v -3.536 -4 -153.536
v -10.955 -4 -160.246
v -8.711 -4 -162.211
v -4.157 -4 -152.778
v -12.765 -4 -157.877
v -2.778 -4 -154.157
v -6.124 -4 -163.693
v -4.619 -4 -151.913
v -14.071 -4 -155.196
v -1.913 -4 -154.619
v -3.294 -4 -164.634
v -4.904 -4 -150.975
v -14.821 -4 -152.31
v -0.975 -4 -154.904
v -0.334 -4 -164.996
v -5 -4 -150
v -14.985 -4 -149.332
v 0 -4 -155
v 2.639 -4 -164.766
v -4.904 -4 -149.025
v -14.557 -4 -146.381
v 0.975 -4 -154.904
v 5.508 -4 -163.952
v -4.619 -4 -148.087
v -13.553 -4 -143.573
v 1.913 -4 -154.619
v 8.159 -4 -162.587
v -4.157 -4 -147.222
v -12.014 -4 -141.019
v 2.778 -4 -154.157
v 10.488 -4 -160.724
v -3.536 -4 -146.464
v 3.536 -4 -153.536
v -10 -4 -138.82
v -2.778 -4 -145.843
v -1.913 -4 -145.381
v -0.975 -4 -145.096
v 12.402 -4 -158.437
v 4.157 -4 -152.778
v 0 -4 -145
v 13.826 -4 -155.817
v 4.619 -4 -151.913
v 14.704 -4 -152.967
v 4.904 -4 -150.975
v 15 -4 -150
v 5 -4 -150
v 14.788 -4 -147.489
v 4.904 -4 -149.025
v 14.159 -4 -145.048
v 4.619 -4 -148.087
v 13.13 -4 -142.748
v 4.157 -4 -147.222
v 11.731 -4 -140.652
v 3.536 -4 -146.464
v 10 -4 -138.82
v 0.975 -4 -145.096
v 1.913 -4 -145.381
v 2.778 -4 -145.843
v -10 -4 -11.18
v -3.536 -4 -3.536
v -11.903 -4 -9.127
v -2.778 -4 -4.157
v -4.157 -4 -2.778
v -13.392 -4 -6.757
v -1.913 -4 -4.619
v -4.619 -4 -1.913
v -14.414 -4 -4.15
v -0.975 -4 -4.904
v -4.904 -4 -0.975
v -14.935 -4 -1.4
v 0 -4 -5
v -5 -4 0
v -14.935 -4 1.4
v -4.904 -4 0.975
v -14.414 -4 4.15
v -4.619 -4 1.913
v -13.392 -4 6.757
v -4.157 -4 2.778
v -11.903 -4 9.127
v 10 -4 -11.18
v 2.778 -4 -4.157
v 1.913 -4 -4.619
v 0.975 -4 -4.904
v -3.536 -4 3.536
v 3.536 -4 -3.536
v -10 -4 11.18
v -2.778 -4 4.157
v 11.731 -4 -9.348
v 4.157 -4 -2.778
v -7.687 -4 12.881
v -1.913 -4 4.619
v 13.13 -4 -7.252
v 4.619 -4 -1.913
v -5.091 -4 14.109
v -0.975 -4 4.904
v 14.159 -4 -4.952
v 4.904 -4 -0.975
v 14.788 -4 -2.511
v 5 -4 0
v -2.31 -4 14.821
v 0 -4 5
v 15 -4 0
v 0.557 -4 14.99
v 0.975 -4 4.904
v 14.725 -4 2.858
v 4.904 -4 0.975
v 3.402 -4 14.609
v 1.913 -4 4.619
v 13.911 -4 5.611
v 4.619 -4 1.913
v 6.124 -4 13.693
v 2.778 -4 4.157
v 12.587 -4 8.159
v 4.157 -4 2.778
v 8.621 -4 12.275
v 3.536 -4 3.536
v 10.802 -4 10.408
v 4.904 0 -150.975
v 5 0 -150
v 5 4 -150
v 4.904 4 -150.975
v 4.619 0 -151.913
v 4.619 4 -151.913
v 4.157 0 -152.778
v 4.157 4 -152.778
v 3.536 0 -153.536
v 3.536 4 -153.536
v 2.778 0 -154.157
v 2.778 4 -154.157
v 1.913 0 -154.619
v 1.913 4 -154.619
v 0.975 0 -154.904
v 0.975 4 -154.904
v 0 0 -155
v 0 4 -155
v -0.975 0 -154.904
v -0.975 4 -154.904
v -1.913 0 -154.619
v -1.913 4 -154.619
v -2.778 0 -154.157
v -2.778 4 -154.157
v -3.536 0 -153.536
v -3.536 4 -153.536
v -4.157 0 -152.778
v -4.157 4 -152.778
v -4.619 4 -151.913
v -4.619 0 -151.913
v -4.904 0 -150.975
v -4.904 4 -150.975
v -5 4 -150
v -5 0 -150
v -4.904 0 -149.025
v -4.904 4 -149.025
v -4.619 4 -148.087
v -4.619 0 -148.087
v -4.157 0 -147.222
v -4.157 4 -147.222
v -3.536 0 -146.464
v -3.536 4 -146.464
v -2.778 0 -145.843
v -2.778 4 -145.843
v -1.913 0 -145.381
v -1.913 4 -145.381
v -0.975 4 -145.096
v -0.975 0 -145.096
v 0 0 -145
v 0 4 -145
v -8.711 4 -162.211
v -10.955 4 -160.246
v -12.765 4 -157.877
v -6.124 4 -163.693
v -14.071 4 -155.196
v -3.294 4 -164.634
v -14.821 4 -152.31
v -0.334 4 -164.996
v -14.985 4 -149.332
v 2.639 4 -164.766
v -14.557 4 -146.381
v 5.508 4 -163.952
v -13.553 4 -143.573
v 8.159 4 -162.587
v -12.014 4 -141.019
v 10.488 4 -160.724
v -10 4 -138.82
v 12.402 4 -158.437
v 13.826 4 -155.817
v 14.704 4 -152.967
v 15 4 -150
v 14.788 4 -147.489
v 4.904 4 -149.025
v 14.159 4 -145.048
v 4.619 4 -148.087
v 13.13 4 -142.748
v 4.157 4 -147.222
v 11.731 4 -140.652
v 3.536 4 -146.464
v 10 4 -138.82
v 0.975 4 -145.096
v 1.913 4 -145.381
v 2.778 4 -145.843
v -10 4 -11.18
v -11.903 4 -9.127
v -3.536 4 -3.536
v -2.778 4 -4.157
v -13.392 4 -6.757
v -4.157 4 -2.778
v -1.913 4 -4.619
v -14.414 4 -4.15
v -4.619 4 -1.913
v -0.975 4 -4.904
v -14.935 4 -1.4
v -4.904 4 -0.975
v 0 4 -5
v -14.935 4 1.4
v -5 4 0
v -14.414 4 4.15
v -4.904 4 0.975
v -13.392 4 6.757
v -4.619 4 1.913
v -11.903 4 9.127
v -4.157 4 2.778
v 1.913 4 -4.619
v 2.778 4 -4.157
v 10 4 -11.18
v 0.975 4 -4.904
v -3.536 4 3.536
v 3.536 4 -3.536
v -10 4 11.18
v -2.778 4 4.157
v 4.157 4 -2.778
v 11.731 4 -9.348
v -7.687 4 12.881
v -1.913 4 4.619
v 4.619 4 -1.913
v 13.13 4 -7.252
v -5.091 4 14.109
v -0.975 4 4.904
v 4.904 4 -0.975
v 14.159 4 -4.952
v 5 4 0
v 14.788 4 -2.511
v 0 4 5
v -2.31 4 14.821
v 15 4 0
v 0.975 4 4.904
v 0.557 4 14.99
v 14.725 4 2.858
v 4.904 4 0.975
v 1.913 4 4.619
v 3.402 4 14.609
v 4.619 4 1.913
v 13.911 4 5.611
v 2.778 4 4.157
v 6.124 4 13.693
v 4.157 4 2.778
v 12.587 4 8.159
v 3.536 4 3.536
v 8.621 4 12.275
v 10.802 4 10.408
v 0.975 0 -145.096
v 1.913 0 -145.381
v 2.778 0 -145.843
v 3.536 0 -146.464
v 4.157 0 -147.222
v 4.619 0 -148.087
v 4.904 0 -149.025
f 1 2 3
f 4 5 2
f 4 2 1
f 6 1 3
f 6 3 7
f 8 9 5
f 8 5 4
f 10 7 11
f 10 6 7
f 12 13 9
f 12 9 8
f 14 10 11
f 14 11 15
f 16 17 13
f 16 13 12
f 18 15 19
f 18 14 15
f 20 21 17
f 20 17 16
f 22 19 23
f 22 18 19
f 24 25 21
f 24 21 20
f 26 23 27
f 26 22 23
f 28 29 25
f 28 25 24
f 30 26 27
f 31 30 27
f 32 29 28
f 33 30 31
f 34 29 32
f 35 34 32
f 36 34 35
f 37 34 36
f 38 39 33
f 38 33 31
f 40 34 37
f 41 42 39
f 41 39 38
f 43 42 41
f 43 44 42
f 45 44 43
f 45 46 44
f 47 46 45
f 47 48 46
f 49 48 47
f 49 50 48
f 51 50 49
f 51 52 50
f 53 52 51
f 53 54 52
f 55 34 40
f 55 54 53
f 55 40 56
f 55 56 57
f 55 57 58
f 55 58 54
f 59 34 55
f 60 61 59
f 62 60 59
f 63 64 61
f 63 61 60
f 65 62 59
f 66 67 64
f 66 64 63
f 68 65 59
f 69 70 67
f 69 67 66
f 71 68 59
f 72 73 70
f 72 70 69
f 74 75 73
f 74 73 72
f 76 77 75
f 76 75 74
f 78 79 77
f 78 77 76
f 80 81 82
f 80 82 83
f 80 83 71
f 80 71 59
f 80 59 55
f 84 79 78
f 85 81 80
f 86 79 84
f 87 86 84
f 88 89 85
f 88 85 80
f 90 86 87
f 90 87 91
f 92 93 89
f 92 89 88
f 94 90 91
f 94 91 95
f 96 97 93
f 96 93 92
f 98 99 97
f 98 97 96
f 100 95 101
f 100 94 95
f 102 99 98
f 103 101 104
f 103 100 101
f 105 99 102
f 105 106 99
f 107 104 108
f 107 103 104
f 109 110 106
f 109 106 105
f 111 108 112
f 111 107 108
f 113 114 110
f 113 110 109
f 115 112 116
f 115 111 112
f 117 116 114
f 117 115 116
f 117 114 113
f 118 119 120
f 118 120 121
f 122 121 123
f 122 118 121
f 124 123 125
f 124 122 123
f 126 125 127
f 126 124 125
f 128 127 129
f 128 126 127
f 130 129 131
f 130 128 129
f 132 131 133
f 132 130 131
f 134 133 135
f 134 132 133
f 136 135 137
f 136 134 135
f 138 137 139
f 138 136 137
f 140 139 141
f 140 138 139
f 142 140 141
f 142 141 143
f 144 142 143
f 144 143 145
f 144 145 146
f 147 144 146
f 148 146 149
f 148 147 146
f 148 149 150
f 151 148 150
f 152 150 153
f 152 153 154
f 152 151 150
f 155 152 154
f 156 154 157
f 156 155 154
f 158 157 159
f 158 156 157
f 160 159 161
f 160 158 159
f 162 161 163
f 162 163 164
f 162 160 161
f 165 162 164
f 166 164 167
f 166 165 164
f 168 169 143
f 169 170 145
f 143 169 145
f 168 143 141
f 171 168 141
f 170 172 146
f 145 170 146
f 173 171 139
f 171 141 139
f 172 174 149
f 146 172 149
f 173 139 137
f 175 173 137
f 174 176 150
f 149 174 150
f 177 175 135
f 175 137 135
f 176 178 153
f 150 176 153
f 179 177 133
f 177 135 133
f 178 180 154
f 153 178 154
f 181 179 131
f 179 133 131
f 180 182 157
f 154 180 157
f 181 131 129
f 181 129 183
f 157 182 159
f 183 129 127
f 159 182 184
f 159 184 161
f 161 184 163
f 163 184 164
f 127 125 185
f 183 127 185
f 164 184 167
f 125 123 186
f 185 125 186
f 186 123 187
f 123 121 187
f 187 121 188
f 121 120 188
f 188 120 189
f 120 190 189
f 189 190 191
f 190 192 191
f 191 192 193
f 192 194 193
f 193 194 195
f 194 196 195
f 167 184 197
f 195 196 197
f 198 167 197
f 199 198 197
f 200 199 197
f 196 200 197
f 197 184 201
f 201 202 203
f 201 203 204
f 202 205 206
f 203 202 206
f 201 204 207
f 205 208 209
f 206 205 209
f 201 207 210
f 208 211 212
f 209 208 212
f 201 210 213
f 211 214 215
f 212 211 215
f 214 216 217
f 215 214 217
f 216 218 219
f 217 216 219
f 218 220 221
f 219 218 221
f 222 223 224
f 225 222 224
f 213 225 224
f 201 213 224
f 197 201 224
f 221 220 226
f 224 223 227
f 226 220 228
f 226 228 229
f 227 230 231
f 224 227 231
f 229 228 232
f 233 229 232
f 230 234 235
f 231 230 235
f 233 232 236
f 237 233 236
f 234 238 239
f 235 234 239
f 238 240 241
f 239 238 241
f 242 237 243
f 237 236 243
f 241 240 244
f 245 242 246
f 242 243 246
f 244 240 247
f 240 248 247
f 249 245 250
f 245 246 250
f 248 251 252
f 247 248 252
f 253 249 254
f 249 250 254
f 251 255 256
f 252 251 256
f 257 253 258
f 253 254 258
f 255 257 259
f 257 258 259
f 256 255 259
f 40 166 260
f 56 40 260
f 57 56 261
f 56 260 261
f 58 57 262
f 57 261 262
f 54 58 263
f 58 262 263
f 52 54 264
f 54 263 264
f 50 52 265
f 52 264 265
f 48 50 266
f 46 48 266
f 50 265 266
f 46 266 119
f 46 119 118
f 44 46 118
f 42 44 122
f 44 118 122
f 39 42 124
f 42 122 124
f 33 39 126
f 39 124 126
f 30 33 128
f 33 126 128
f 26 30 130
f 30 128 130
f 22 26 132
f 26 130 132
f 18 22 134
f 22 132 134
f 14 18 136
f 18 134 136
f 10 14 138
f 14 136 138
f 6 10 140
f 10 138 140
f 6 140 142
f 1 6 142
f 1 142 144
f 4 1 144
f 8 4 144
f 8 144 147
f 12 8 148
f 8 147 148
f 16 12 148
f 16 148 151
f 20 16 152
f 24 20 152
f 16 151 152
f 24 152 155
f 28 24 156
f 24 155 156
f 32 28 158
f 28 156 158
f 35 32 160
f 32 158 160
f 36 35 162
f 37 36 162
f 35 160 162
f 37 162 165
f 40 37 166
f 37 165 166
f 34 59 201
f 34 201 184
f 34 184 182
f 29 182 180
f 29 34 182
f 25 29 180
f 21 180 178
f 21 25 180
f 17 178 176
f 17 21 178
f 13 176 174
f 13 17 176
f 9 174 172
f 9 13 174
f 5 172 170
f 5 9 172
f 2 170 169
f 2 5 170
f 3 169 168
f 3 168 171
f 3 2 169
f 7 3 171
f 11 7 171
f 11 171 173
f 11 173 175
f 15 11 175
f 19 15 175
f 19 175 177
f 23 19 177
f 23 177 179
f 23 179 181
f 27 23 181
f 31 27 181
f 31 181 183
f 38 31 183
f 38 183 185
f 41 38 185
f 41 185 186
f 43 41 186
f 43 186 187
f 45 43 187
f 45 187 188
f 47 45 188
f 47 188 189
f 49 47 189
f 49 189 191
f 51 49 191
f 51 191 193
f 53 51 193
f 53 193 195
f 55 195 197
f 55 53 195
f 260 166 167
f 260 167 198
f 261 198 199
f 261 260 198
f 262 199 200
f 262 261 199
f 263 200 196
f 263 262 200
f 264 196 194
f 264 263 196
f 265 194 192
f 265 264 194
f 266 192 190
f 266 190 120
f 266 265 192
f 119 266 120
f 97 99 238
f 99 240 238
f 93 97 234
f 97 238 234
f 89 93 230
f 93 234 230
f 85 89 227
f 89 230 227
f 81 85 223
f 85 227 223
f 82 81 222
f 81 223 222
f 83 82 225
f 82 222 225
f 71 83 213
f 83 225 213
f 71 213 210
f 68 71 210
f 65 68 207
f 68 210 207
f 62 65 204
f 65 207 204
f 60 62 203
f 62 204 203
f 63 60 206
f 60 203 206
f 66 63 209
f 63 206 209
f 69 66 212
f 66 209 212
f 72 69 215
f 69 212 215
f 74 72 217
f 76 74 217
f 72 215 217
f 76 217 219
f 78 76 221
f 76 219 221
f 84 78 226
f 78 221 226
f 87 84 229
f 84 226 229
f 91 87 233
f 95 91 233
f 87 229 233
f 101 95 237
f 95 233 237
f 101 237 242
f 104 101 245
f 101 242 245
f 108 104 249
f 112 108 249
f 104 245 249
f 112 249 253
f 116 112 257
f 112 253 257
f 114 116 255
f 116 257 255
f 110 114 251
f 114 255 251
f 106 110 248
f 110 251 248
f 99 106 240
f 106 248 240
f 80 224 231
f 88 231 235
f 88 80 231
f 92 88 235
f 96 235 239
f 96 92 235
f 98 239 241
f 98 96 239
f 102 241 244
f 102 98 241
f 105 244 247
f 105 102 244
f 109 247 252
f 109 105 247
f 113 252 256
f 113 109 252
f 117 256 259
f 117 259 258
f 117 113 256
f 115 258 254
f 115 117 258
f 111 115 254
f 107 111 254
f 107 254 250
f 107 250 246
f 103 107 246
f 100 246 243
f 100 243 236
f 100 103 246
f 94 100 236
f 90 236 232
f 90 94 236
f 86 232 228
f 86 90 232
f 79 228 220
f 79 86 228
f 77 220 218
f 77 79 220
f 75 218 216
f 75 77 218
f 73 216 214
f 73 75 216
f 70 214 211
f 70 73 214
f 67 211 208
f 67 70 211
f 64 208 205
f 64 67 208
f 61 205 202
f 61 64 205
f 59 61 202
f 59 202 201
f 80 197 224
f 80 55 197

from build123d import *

# Parameters (mm, degrees)
F1_DEPTH = 4


with BuildPart() as f1:
    # F0 (on Front) → F1 (new body, symmetric)
    with BuildSketch(Plane.XZ):
        with BuildLine():
            ThreePointArc((10, -11.1803398875), (13.6930639376, -6.123724357), (15, 0))
            ThreePointArc((15, 0), (6.123724357, 13.6930639376), (-10, 11.1803398875))
            Line((-10, 11.1803398875), (-10, -11.1803398875))
            ThreePointArc((-10, -11.1803398875), (-5.3523313466, -14.0125853844), (0, -15))
            ThreePointArc((0, -15), (5.3523313466, -14.0125853844), (10, -11.1803398875))
        make_face()
        with BuildLine():
            ThreePointArc((5, 0), (3.5355339059, -3.5355339059), (0, -5))
            ThreePointArc((0, -5), (-3.5355339059, 3.5355339059), (5, 0))
        make_face(mode=Mode.SUBTRACT)
        with BuildLine():
            Line((-10, -11.1803398875), (-10, 11.1803398875))
            ThreePointArc((-10, 11.1803398875), (-15, 0), (-10, -11.1803398875))
        make_face()
        with BuildLine():
            Line((10, -138.8196601125), (10, -11.1803398875))
            ThreePointArc((10, -11.1803398875), (5.3523313466, -14.0125853844), (0, -15))
            Line((0, -15), (0, -135))
            ThreePointArc((0, -135), (5.3523313466, -135.9874146156), (10, -138.8196601125))
        make_face()
        with BuildLine():
            ThreePointArc((0, -15), (-5.3523313466, -14.0125853844), (-10, -11.1803398875))
            Line((-10, -11.1803398875), (-10, -138.8196601125))
            ThreePointArc((-10, -138.8196601125), (-5.3523313466, -135.9874146156), (0, -135))
            Line((0, -135), (0, -15))
        make_face()
        with BuildLine():
            ThreePointArc((15, -150), (13.6930639376, -143.876275643), (10, -138.8196601125))
            ThreePointArc((10, -138.8196601125), (5.3523313466, -135.9874146156), (0, -135))
            ThreePointArc((0, -135), (-5.3523313466, -135.9874146156), (-10, -138.8196601125))
            ThreePointArc((-10, -138.8196601125), (-6.123724357, -163.6930639376), (15, -150))
        make_face()
        with BuildLine():
            ThreePointArc((5, -150), (-3.5355339059, -153.5355339059), (0, -145))
            ThreePointArc((0, -145), (3.5355339059, -146.4644660941), (5, -150))
        make_face(mode=Mode.SUBTRACT)
    extrude(amount=F1_DEPTH, both=True)


solid = f1.part
